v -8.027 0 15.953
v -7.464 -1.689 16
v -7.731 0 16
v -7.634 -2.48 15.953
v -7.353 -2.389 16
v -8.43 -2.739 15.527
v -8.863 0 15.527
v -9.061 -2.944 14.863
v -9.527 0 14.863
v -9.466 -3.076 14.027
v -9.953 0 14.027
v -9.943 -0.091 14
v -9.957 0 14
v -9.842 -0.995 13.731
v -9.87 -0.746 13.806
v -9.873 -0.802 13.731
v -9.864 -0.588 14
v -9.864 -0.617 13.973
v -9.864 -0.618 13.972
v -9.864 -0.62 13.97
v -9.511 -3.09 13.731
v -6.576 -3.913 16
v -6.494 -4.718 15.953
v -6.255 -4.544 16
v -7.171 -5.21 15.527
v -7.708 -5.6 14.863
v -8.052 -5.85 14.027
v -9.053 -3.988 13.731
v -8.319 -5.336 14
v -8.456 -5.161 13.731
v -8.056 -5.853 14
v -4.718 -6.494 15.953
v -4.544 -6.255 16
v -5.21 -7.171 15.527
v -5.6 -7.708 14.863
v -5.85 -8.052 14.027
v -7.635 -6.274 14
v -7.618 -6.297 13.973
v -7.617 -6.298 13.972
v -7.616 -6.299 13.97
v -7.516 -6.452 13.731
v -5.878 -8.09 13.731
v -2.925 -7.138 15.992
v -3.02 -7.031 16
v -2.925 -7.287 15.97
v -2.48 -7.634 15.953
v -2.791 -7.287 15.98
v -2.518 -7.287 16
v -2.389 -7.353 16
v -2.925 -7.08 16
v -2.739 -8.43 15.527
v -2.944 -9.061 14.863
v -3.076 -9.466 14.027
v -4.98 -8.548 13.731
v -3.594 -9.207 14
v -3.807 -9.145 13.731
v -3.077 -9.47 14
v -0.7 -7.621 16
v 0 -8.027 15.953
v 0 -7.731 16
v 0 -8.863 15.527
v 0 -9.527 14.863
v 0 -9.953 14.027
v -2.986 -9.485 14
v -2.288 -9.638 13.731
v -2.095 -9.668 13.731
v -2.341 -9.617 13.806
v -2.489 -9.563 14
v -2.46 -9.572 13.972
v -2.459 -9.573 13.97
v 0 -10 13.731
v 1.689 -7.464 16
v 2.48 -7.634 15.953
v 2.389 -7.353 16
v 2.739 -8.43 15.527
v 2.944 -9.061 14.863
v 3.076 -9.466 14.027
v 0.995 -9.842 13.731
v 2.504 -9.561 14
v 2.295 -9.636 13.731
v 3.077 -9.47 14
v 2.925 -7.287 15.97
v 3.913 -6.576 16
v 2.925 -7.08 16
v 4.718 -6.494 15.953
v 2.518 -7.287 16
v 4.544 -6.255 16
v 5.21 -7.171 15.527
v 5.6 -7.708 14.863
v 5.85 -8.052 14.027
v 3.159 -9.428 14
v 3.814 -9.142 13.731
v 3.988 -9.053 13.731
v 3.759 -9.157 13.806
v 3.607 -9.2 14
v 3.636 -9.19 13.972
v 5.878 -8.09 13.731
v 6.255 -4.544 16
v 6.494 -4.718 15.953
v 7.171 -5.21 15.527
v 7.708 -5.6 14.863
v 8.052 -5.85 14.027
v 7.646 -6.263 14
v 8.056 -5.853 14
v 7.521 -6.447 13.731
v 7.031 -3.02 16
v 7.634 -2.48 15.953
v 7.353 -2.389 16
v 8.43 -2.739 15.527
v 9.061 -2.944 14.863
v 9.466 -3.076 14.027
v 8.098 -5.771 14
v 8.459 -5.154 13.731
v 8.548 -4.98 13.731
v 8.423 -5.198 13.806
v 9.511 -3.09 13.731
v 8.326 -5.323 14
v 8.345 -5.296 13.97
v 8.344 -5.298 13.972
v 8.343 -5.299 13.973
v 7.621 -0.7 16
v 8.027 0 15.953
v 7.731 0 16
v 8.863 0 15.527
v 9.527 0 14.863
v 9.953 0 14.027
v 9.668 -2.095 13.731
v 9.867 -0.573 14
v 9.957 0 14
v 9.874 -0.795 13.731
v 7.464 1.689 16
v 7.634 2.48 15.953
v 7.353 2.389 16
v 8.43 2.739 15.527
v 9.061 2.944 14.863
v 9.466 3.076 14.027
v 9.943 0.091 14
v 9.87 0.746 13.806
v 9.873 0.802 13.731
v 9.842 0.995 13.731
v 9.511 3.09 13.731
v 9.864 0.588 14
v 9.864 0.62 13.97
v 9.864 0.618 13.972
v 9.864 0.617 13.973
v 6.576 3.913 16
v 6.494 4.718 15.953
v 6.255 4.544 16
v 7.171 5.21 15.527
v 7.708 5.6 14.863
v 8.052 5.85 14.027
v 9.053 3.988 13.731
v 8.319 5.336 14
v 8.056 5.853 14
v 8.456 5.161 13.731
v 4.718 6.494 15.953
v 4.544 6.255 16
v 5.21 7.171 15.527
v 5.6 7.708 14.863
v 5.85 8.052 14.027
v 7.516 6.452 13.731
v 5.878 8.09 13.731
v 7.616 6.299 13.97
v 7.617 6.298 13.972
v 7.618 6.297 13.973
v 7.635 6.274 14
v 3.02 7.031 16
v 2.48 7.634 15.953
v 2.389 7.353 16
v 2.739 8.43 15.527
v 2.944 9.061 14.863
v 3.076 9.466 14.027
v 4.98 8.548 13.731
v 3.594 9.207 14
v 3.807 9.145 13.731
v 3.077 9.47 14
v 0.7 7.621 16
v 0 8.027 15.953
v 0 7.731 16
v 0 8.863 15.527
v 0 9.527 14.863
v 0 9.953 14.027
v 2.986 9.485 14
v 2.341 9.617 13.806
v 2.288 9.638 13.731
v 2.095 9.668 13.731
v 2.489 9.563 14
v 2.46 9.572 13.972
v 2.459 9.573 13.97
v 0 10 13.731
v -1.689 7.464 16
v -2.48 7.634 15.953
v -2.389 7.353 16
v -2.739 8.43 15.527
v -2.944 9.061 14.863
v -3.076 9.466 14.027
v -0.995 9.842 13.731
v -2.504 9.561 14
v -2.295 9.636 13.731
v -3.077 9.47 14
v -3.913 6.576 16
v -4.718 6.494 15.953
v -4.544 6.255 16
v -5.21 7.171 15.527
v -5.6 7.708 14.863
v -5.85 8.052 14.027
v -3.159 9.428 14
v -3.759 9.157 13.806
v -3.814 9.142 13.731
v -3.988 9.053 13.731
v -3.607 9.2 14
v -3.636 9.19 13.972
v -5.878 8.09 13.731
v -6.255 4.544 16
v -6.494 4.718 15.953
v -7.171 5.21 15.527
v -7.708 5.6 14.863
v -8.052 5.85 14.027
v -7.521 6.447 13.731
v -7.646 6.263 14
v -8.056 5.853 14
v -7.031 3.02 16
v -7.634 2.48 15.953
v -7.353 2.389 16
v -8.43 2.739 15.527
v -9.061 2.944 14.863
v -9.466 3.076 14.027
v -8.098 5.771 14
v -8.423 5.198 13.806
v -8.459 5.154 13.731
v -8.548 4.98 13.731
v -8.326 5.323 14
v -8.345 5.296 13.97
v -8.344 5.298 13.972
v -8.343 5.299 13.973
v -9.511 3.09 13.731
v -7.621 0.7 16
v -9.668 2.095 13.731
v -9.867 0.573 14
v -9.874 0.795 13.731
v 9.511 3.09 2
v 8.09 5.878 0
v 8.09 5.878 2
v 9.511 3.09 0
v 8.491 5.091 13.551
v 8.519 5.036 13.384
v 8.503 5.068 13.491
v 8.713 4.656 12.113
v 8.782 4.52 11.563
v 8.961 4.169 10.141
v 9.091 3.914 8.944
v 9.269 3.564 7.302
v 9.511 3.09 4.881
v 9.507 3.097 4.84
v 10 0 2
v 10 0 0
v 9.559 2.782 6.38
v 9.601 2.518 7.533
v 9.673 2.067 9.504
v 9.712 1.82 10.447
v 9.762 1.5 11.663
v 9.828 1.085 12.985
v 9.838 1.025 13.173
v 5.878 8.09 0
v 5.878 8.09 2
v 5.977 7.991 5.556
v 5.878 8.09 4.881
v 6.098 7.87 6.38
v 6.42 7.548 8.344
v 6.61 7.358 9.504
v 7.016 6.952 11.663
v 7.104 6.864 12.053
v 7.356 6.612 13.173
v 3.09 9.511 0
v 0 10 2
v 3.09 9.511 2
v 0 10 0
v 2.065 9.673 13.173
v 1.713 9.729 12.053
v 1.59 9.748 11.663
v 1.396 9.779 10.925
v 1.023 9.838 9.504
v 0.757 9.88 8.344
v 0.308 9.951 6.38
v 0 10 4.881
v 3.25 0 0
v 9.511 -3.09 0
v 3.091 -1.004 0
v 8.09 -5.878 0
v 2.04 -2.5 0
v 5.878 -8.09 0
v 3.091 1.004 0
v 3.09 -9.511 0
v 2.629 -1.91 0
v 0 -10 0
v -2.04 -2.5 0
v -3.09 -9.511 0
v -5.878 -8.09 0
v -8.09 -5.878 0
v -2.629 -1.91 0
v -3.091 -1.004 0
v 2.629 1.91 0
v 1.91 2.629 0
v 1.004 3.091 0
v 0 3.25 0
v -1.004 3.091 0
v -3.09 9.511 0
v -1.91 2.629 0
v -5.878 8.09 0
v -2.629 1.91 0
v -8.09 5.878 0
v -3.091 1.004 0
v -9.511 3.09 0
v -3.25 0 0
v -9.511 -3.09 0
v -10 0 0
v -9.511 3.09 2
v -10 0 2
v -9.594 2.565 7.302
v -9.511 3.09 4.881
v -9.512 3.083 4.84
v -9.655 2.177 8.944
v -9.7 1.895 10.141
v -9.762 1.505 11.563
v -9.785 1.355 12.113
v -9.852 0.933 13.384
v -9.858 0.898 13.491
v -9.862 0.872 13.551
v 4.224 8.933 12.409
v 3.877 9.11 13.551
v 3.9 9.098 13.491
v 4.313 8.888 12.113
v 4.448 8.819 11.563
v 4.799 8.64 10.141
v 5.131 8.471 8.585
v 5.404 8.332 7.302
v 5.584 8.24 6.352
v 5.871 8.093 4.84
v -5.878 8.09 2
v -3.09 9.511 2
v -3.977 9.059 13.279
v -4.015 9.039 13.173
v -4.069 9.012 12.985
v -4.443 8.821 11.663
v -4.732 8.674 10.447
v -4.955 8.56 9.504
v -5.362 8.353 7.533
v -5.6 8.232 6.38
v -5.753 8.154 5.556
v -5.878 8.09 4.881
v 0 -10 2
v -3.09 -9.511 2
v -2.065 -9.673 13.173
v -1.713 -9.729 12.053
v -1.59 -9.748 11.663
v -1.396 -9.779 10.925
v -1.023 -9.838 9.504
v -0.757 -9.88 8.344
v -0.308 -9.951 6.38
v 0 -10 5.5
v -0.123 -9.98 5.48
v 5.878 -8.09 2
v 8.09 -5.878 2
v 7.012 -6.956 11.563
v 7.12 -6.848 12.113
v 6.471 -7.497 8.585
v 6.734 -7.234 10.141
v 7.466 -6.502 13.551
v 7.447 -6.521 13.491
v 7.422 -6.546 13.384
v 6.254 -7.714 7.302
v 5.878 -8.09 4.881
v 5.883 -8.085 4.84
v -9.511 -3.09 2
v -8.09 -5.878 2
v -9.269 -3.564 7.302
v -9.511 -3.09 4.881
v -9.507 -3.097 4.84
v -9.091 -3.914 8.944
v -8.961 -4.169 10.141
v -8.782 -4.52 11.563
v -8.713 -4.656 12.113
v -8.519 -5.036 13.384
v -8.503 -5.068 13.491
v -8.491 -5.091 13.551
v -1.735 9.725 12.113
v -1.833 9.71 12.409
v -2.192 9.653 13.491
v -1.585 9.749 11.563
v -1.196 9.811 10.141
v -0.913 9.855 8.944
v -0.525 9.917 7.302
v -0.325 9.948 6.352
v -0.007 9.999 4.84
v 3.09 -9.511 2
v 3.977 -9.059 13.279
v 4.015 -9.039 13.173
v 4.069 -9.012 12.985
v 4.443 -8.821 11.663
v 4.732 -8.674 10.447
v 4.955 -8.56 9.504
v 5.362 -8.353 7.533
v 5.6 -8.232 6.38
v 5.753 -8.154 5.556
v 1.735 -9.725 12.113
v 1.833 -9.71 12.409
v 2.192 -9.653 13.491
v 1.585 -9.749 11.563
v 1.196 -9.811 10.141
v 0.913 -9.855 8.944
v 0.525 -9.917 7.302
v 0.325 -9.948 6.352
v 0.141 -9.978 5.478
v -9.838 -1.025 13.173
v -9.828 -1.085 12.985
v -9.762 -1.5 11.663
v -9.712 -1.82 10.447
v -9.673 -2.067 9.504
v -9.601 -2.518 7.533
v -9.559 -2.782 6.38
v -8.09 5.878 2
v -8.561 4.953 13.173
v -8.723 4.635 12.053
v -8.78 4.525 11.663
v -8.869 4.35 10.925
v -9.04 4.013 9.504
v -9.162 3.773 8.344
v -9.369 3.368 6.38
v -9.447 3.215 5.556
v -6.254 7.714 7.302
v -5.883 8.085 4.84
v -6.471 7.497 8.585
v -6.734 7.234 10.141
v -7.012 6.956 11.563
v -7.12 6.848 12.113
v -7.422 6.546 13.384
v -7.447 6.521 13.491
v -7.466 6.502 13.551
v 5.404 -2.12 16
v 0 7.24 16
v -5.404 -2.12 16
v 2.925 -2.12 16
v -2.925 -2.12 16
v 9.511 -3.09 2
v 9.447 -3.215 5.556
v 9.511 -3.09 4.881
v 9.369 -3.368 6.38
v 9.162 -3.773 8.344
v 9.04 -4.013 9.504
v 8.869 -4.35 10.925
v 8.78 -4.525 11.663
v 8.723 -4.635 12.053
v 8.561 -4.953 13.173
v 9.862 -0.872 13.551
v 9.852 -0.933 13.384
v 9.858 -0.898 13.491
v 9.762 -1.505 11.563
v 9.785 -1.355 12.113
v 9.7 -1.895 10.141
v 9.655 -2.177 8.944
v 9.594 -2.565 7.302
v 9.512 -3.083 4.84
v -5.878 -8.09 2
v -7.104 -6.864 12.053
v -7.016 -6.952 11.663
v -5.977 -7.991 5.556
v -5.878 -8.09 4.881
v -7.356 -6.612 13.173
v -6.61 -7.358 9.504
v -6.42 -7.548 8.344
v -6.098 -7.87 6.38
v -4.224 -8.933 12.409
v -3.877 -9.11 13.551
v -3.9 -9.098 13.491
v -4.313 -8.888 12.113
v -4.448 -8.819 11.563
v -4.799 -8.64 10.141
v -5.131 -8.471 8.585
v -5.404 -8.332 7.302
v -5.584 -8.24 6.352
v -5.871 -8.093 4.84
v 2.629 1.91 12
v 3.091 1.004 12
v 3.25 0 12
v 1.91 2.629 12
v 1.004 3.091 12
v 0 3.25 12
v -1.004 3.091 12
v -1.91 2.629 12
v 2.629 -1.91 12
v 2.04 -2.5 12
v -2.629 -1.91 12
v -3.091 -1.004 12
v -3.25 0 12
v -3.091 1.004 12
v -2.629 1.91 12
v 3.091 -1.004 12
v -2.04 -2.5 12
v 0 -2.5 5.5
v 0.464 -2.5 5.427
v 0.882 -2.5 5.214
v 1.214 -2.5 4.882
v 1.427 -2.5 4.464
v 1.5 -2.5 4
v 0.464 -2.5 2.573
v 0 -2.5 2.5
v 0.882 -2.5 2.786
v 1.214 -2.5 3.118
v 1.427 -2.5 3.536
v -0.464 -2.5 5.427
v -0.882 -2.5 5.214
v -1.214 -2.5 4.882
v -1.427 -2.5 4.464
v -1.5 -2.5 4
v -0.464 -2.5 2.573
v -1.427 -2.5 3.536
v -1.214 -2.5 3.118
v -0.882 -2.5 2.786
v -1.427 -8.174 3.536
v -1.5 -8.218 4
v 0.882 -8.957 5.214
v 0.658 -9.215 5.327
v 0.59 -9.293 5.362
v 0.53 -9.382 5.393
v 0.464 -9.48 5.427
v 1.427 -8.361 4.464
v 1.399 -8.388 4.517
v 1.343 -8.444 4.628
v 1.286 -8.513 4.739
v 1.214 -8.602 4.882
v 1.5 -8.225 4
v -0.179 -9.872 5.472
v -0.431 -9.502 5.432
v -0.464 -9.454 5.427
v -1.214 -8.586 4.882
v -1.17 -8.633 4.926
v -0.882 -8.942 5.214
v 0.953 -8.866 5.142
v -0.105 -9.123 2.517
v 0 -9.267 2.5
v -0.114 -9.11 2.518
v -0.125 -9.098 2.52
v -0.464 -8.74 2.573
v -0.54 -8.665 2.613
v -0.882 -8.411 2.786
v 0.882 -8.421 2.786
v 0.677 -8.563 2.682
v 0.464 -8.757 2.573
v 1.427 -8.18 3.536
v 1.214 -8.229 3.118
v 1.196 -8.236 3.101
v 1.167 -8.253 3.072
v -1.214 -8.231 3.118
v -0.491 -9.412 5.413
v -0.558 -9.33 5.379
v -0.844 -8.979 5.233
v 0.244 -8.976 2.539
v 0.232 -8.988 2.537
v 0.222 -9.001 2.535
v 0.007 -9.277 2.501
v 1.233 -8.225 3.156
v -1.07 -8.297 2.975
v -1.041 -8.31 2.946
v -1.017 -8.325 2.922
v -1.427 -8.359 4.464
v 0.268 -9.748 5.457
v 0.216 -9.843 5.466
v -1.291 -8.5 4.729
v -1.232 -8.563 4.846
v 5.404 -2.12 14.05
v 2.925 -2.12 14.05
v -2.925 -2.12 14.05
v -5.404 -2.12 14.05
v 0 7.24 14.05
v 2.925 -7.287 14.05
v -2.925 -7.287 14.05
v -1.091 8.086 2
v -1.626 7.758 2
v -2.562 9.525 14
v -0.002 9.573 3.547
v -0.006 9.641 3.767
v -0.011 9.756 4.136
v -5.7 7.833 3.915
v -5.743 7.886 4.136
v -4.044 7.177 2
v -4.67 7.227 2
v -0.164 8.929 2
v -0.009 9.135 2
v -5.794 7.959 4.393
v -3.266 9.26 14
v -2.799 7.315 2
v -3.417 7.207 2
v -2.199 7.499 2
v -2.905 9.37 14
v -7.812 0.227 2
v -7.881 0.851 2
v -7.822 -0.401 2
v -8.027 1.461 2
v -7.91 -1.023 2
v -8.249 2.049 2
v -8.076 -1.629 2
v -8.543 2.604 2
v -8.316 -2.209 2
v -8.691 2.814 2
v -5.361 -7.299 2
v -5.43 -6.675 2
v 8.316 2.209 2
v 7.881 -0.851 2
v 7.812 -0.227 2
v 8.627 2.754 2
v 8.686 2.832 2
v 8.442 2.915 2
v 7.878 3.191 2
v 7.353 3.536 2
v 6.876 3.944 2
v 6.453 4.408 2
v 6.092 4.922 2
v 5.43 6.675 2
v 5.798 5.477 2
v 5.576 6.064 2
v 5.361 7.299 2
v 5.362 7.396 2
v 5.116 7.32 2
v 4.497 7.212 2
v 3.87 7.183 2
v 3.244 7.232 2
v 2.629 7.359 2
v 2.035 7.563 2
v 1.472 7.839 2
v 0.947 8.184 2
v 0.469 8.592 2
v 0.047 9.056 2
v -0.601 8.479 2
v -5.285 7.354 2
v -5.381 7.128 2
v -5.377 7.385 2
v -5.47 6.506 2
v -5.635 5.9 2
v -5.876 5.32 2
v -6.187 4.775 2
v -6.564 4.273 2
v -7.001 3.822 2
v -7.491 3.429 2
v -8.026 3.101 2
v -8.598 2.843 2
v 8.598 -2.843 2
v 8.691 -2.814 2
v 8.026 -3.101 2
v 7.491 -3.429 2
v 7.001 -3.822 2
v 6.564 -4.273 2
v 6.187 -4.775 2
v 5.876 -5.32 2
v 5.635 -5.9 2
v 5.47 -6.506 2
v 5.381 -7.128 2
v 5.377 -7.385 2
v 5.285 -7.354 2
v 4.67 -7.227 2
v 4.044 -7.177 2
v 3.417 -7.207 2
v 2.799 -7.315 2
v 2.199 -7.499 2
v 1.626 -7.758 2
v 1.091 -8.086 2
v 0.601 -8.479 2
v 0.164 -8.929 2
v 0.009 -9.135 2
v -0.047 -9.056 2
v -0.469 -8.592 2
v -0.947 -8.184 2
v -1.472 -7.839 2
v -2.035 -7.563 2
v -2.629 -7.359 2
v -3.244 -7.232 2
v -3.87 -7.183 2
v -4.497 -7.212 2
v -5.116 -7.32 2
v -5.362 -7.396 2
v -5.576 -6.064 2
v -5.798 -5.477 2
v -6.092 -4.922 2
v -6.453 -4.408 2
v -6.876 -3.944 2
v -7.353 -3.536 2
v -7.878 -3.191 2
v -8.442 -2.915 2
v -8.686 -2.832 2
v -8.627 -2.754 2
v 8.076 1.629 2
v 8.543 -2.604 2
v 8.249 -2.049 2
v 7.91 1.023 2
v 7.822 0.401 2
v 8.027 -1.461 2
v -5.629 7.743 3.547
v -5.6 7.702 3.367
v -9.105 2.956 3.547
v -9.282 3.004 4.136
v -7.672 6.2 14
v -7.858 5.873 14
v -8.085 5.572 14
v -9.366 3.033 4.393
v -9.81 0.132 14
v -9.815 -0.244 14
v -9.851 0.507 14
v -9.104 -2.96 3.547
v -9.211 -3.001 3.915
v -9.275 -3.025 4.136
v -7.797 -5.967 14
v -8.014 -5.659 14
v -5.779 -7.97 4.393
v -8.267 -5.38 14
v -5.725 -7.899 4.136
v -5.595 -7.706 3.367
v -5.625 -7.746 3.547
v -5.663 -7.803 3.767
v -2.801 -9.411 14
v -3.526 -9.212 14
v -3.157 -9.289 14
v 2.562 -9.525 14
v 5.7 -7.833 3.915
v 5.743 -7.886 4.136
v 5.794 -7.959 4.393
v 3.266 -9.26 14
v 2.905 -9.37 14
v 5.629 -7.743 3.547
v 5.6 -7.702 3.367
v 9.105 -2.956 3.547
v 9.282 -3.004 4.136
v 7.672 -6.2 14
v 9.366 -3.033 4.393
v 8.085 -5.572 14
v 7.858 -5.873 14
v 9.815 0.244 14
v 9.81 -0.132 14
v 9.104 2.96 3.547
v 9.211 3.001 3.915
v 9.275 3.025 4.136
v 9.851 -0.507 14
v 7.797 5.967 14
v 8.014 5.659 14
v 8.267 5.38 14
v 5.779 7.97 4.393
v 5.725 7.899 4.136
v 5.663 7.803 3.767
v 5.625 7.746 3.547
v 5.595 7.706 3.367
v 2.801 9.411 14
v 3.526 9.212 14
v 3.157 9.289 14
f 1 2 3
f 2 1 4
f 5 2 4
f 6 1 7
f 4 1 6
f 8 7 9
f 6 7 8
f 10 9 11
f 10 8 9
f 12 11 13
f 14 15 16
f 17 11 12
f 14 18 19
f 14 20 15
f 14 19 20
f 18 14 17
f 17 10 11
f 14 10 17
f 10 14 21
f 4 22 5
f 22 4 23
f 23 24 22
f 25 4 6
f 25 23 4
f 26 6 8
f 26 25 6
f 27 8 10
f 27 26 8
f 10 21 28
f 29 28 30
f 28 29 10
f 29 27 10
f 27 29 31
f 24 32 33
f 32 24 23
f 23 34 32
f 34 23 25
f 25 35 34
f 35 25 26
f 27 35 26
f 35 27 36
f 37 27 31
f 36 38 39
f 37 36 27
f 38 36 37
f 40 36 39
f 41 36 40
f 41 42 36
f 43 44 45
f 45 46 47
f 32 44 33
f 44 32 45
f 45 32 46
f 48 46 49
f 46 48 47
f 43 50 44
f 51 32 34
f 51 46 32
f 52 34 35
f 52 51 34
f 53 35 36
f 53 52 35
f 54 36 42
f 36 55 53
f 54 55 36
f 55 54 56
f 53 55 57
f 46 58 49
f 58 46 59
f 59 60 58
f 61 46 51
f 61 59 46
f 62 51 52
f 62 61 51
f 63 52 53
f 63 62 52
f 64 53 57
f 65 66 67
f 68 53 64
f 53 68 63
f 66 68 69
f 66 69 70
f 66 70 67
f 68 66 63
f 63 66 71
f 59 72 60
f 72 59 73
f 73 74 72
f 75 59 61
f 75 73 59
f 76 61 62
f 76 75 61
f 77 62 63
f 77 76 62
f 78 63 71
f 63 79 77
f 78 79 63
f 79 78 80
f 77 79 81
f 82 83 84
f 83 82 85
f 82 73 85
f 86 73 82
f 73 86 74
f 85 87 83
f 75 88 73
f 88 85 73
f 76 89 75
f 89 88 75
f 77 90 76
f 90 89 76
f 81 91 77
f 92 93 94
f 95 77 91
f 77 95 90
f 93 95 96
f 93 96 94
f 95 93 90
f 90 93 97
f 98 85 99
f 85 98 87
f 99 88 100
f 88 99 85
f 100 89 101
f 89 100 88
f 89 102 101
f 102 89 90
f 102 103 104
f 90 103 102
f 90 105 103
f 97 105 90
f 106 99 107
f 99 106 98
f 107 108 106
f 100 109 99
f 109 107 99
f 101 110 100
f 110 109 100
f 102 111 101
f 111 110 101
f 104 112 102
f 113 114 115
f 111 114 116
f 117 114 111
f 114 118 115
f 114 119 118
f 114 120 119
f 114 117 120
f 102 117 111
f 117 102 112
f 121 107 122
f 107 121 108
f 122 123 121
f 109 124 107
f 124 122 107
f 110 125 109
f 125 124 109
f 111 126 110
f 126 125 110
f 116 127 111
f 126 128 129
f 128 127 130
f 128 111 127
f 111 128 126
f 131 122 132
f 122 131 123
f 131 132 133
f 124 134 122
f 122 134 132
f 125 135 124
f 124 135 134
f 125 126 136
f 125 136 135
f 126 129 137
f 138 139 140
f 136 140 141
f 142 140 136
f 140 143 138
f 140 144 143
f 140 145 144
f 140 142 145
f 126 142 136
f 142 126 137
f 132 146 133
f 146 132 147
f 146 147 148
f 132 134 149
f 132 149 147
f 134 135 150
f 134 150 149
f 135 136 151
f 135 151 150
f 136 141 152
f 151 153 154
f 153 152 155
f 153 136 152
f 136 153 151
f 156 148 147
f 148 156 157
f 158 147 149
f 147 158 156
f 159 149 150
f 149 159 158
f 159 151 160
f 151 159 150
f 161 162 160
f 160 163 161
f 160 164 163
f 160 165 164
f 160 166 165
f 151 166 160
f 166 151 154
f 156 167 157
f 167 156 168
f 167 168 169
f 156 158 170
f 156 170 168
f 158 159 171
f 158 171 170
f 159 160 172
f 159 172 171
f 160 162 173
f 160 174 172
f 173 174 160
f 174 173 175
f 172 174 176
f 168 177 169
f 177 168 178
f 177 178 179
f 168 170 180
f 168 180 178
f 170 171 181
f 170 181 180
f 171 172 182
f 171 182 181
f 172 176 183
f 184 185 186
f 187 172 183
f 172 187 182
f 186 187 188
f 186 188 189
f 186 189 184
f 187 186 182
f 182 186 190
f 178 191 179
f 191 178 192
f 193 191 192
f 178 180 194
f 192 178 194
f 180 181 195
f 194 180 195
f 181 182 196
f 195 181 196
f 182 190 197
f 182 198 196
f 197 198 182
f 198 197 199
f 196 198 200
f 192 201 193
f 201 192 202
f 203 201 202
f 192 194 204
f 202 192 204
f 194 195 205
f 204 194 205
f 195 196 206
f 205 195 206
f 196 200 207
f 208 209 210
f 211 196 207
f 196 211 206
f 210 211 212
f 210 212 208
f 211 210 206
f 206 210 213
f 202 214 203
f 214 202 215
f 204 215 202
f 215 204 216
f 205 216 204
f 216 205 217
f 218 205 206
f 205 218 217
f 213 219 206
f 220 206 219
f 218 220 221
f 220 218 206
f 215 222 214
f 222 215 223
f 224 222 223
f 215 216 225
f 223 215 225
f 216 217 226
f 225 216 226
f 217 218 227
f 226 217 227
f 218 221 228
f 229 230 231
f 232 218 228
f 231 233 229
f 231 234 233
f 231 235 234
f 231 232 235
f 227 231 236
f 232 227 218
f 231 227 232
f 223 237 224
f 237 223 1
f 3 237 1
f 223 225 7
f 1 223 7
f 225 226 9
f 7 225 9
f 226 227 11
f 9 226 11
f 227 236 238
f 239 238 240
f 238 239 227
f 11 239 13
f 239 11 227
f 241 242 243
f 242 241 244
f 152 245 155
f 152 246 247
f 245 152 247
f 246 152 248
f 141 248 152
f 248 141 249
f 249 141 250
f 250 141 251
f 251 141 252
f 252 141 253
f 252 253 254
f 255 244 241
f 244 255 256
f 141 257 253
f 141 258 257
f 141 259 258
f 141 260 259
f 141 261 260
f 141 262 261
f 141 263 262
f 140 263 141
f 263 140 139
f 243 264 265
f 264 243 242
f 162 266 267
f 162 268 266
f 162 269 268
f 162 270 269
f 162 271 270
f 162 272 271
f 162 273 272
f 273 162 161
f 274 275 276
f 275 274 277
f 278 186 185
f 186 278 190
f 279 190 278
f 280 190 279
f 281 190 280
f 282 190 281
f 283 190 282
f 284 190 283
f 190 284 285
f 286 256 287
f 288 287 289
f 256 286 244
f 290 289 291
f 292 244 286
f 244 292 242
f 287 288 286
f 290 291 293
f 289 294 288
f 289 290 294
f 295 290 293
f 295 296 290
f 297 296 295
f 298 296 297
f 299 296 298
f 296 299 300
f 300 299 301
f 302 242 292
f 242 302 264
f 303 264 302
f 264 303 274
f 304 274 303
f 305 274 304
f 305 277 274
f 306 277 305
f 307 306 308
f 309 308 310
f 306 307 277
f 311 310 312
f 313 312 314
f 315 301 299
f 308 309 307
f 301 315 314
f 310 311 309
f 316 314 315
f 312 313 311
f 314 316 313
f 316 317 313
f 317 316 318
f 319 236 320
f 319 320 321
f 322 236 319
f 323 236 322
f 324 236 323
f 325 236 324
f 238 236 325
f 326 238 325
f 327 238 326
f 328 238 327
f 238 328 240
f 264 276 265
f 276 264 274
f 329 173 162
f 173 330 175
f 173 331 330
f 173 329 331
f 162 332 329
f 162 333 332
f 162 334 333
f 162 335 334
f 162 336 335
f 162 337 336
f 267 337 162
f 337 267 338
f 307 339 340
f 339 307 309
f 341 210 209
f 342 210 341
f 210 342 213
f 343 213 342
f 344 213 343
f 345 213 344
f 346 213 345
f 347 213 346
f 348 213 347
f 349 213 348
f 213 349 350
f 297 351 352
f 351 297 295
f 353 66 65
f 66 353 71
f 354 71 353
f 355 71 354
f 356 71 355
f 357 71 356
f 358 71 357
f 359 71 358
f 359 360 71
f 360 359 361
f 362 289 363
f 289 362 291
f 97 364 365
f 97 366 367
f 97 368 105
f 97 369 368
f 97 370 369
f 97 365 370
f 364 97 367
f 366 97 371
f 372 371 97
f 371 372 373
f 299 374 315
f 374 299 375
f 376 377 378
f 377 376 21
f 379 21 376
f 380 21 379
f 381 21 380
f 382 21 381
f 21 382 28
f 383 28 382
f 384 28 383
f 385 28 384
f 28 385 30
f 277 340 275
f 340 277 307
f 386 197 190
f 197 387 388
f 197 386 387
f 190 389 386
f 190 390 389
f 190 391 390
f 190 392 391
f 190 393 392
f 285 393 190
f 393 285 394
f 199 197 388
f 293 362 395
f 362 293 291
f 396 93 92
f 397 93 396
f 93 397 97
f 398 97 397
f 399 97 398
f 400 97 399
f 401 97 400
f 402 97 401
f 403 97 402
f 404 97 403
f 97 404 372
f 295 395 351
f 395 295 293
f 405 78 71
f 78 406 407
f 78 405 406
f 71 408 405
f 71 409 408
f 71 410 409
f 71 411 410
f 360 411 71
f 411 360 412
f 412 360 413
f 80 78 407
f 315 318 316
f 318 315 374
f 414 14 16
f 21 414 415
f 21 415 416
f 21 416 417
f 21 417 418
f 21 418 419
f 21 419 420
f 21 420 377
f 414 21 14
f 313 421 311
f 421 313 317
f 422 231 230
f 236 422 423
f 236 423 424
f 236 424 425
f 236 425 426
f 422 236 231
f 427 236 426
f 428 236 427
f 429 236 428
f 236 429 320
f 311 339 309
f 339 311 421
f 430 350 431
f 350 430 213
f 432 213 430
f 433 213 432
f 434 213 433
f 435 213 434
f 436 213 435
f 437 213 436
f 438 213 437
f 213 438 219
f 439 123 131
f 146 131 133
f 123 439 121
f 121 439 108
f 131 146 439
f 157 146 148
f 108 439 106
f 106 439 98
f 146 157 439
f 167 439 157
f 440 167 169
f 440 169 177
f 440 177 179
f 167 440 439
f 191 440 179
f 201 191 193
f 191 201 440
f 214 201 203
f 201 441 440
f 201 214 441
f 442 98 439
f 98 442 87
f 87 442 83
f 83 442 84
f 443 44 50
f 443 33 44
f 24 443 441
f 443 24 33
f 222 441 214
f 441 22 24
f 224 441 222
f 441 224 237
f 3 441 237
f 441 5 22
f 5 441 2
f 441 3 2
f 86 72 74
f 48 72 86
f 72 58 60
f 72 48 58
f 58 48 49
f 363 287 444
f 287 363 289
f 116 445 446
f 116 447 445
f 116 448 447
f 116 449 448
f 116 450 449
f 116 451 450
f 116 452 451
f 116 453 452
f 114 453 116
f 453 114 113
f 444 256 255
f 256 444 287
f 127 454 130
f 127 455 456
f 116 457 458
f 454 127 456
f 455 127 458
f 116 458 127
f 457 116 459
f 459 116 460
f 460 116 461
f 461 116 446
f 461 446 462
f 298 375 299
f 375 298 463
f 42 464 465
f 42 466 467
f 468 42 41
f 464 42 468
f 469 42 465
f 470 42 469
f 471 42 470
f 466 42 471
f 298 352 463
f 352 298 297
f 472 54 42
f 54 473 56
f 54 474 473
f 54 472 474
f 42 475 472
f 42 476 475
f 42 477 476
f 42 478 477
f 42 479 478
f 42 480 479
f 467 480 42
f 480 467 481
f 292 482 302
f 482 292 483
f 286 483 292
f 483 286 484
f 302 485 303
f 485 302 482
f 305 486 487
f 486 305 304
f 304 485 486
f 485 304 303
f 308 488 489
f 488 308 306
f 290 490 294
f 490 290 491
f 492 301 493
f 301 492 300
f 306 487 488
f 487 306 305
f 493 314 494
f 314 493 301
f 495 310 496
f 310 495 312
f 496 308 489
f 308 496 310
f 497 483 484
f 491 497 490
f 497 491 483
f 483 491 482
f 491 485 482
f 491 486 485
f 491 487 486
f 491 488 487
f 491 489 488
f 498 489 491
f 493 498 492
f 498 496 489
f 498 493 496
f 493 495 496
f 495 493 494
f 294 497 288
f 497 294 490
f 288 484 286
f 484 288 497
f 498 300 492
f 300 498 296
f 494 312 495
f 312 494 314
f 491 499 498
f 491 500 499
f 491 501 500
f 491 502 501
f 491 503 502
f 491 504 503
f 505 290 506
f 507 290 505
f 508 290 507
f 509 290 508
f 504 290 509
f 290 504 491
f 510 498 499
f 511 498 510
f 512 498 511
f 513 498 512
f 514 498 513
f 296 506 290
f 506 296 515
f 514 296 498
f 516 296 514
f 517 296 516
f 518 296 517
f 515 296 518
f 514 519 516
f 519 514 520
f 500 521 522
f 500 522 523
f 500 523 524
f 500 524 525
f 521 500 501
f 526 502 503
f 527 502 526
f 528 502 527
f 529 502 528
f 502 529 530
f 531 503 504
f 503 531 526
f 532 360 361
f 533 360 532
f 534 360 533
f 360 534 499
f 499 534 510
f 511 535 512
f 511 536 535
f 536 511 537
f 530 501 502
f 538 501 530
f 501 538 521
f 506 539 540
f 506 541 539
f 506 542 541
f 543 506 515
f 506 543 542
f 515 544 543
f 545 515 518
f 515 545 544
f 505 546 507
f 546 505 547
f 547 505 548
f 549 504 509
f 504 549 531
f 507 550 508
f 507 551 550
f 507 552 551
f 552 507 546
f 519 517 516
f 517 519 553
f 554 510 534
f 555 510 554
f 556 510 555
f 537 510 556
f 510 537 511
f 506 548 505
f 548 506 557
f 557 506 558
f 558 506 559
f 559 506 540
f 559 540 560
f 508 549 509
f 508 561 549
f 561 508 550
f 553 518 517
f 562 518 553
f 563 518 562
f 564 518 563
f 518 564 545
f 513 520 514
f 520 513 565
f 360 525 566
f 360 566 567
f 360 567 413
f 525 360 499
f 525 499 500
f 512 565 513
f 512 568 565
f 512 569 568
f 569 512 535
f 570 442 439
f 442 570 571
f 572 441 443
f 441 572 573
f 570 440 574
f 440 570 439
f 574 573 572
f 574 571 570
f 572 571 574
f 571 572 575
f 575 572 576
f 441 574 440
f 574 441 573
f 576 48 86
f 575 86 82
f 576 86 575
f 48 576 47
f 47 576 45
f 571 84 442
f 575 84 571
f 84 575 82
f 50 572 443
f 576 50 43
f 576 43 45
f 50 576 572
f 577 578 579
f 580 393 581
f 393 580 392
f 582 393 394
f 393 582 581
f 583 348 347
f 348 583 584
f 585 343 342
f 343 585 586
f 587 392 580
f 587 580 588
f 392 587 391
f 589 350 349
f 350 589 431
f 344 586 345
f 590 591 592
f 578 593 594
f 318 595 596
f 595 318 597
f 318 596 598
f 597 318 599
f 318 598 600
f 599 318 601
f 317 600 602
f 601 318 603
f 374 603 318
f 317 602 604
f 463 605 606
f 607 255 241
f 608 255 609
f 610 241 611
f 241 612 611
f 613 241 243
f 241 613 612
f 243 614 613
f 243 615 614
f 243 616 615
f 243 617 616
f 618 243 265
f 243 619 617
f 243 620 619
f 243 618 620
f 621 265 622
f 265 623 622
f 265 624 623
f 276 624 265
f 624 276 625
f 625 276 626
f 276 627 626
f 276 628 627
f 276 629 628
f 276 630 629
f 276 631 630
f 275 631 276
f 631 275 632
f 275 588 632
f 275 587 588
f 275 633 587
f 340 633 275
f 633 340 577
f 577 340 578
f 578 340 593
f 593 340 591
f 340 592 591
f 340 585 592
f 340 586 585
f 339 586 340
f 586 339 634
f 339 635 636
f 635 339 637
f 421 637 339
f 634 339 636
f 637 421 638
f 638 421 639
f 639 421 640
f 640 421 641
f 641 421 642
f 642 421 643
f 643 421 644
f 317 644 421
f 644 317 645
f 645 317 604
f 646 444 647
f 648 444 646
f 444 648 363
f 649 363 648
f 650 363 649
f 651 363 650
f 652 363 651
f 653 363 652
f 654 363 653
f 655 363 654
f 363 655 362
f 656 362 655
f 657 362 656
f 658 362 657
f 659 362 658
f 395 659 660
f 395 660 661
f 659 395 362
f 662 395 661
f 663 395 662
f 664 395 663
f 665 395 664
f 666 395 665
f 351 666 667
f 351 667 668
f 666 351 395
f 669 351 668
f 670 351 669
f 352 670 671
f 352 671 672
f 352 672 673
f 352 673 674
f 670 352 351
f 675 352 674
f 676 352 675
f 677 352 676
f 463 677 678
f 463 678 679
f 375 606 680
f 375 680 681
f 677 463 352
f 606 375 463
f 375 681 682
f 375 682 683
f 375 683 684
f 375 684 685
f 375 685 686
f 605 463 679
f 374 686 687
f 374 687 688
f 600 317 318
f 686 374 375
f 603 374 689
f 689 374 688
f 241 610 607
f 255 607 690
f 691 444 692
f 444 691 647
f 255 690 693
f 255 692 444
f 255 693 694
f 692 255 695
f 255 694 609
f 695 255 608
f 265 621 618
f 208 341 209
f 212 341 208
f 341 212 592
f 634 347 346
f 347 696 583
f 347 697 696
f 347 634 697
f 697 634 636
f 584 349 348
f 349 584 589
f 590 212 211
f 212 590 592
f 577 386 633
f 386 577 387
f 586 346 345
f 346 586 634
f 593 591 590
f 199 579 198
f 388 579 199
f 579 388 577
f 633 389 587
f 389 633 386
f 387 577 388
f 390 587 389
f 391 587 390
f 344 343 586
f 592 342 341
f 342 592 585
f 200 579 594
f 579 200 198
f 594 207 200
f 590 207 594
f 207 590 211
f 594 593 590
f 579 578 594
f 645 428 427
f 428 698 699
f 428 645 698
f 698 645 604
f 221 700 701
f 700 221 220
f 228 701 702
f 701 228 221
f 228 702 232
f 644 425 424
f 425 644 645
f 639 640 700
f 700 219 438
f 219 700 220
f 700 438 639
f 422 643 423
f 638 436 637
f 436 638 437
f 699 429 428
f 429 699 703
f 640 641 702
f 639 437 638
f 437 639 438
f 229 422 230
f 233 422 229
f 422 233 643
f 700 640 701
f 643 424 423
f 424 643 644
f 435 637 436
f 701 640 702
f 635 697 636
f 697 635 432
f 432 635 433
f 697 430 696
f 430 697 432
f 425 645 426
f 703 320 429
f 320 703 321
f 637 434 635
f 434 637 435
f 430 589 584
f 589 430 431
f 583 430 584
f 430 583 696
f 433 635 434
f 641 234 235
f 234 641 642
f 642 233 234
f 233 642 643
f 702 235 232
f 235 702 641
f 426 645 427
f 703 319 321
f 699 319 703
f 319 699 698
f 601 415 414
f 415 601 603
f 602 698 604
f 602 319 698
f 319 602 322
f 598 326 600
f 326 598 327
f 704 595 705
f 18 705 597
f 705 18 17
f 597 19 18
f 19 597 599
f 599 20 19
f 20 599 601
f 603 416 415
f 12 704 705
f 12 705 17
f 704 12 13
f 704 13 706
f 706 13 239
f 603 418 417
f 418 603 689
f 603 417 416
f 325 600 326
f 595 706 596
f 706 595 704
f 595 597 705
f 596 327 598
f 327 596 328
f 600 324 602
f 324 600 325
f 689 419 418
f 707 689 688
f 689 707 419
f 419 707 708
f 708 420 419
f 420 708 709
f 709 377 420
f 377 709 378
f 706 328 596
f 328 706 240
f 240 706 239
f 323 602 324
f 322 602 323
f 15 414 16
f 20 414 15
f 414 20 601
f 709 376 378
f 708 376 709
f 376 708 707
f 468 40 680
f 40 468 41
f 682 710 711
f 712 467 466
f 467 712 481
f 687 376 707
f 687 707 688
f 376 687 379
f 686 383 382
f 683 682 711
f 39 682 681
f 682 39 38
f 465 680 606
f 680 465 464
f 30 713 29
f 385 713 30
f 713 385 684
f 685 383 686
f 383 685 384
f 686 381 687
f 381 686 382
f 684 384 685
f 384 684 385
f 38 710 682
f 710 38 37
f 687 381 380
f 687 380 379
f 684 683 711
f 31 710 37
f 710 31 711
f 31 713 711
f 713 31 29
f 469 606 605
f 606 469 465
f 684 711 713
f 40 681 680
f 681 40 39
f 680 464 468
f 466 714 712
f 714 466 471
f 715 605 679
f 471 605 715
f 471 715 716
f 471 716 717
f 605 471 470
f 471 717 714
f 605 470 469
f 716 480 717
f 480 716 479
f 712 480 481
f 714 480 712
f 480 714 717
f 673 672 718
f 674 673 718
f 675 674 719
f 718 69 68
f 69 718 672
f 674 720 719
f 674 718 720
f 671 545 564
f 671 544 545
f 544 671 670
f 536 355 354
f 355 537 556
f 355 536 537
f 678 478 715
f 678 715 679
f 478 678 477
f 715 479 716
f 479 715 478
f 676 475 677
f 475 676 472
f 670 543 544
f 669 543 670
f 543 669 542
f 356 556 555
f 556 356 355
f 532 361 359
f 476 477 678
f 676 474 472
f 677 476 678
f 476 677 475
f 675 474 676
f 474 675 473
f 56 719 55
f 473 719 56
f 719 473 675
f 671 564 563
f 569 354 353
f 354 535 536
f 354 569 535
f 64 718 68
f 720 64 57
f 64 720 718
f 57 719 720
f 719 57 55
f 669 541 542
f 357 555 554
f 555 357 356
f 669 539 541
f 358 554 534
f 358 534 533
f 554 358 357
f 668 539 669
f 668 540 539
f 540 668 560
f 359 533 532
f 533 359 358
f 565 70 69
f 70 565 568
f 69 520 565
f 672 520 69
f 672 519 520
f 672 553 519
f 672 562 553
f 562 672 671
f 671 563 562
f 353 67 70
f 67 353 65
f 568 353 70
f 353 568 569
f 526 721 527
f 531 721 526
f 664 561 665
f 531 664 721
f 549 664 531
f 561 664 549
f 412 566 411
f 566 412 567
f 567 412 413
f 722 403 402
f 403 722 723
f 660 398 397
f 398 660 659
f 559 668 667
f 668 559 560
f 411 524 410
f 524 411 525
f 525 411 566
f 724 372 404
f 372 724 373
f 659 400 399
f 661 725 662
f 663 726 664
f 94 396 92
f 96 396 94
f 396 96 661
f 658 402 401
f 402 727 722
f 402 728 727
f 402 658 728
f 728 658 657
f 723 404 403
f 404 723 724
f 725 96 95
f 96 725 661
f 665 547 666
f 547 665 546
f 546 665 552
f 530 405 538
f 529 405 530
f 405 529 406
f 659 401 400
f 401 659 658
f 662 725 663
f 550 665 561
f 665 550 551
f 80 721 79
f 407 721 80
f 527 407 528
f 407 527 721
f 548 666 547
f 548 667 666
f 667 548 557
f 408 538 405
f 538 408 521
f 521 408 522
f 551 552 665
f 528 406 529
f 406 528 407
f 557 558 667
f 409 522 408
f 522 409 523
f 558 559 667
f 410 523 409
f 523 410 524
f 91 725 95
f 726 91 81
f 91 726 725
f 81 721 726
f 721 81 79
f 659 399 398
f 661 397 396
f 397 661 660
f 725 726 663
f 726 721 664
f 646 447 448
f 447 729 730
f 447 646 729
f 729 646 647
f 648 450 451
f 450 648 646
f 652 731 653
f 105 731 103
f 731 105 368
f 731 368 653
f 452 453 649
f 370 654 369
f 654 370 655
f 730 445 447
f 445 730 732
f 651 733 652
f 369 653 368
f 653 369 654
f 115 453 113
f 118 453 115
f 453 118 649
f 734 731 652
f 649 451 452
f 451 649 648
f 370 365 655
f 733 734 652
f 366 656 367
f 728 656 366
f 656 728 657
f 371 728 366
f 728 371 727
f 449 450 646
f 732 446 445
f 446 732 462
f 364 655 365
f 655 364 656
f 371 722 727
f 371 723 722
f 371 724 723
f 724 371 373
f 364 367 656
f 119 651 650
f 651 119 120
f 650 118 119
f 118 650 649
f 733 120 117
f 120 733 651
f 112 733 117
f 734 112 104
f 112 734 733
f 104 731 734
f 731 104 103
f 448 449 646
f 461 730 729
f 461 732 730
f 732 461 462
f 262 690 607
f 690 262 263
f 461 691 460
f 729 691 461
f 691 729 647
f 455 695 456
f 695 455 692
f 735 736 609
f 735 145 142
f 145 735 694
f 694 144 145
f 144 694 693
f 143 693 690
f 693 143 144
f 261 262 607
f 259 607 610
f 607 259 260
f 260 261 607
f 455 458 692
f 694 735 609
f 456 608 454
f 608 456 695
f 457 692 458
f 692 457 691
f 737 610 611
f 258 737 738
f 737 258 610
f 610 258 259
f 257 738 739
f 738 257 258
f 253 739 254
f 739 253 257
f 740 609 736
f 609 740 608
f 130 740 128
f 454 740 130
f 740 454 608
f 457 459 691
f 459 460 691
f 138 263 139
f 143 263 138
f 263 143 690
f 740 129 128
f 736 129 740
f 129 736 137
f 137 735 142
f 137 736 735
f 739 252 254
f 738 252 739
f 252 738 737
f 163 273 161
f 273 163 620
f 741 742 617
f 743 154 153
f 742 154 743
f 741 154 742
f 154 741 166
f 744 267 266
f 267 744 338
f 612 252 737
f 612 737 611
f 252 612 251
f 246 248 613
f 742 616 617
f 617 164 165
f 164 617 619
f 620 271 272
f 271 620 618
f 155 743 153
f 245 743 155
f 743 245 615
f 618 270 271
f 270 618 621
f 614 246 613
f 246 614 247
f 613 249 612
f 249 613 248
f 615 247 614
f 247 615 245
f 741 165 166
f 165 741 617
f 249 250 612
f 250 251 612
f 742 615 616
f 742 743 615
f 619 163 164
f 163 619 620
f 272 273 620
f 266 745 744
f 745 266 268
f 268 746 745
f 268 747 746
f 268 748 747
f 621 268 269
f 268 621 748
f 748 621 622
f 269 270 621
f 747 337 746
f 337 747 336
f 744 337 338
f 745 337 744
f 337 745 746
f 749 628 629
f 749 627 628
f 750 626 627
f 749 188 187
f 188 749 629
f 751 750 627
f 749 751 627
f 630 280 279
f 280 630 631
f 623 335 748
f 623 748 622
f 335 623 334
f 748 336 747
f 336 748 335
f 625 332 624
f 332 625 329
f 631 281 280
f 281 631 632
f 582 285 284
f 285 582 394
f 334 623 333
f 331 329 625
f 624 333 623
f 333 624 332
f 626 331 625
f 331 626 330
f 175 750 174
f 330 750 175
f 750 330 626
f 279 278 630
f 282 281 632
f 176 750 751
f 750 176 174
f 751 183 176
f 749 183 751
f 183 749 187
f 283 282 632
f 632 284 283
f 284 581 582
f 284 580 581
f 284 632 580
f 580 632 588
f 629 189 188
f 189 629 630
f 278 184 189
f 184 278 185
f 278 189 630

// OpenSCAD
/*

Parametric Potentiometer Knob Generator
version 1.1
2012 Steve Cooley
http://sc-fa.com
http://beatseqr.com
http://hapticsynapses.com

parametric potentiometer knob generator by steve cooley is licensed under a Creative Commons Attribution-NonCommercial-ShareAlike 3.0 Unported License. Based on a work at sc-fa.com. Permissions beyond the scope of this license may be available at http://sc-fa.com/blog/contact.

view terms of the license here:
http://creativecommons.org/licenses/by-nc-sa/3.0/


version history
---------------
1.1 2012-04-12 fixed the arrow indicator code to be more robust and easier to adjust parameters for.
1.0 2012-03-?? initial release.


*/


//
//
// Physical attributes, basic
//
//

knob_radius_top = 10;
knob_radius_bottom = 10;
knob_height = 16;
knob_smoothness = 20;

shaft_radius = 3.25;
shaft_height = 13;
shaft_smoothness = 20;

shaft_is_flatted = true;
flat_size_adjustment = -0.0;
// you won't need to mess with this. less than 5 makes it disappear. you can, however,
// set the adjustment to be a negative decimal if you need a flat but not as big as the default. 
// go positive if you need a bigger flat
flat_size = 5 + flat_size_adjustment;

// some potentiometers need to have their knobs affixed with a set screw.
set_screw = true;
set_screw_radius = 1.5;
set_screw_depth = 9;
set_screw_height = 4;
quality_of_set_screw = 20;

//
// 
// Decorations
//
//

//
// top edge smoothing
// thanks to http://www.iheartrobotics.com/ for the articles!
//

smoothing = true;
smoothing_radius = 3;				// tweak on this one, how much smoothing to apply
smooth = 20;						// tweak on this one, Number of facets of rounding cylinder

ct = -0.1; 							// circle translate? not sure.
circle_radius = knob_radius_top;  	// just match the top edge radius
circle_height = 1; 					// actually.. I don't know what this does.
pad = 0.2;							// Padding to maintain manifold


//
// directional indicators
//

// this is a corner edge of a cube sticking out of the cylinder at the bottom
// you can use it instead of the arrow shaped cutout in the top if you like. Or both.

pointy_external_indicator = false;
pointy_external_indicator_height = 11;
pointy_external_indicator_pokey_outey_ness = -0.0; // 
pokey_outey_value = pointy_external_indicator_pokey_outey_ness - 1 - pad;
pokey_outey = [pokey_outey_value, pokey_outey_value,0];

// there's an arrow shaped hole you can have. There aren't a lot of controls for this.
// please feel free to improve on this script here.

arrow_indicator = true;
arrow_indicator_scale = 1.3;
arrow_indicator_translate = [0,1,16];
arrow_scale_head = 2;
arrow_scale_shaft = 1.5;

//
// indentations
//

// for spherical indentations, set the quantity, quality, size, and adjust the placement
indentations_sphere = false;
sphere_number_of_indentations = 12;
sphere_quality_of_indentations = 4;
size_of_sphere_indentations = 4;
// the first number in this set moves the spheres in or out. smaller is closer to the middle
// the second number in this set moves the spheres left or right
// the third number in this set moves the speheres up or down
translation_of_sphere_indentations = [10,0,15];
// in case you are using an odd number of indentations, you way want to adjust the starting angle
// so that they align to the front or set screw locations.
sphere_starting_rotation = 90;

// for cylinder indentations, set quantity, quality, radius, height, and placement
indentations_cylinder = true;
cylinder_number_of_indentations = 10;
cylinder_quality_of_indentations = 50;
radius_of_cylinder_indentations_top = 3;
radius_of_cylinder_indentations_bottom = 5;
height_of_cylinder_indentations = 12;
translation_of_cylinder_indentations = [0,8,-8];
cylinder_starting_rotation = -33.3;

// these are some setup variables... you probably won't need to mess with them.
negative_knob_radius = knob_radius_bottom*-1;


// this is the main module. It calls the submodules.
make_the_knob();

module make_the_knob()
{
	difference()
		{
		difference()
			{
		
			difference() 
				{
				difference() 
					{
					
					union()
						{
						
						difference()
							{
							// main cylinder
							cylinder(r1=knob_radius_bottom,r2=knob_radius_top,h=knob_height, $fn=knob_smoothness);
							
							smoothing();				
		
							}
				
						external_direction_indicator();	
						}
					
					shaft_hole();
					}
					
				set_screw_hole();
				}
			
			arrow_indicator();
			indentations();
		}
	}

}

module smoothing() {

// smoothing the top
				if(smoothing == true)
					{		
						translate([0,0,knob_height])
						rotate([180,0,0])
						difference() {
							rotate_extrude(convexity=10,  $fn = smooth)
							translate([circle_radius-ct-smoothing_radius+pad,ct-pad,0])
							square(smoothing_radius+pad,smoothing_radius+pad);
	
							rotate_extrude(convexity=10,  $fn = smooth)
							translate([circle_radius-ct-smoothing_radius,ct+smoothing_radius,0])
							circle(r=smoothing_radius,$fn=smooth);
							}	
					}
}

module external_direction_indicator() {

				if(pointy_external_indicator == true)
						{
						
						
						// outer pointy indicator
						rotate([0,0,45])
						translate(pokey_outey)
						// cube size of 8 minimum to point out
						cube(size=[knob_radius_bottom,knob_radius_bottom,pointy_external_indicator_height],center=false);
						}

}

module shaft_hole() {
				// shaft hole
				difference()
					{
					
					// round shaft hole
					translate([ 0, 0, -1 ]) 
					cylinder(r=shaft_radius,h=shaft_height, $fn=shaft_smoothness);
					
					if(shaft_is_flatted == true)
						{
						// D shaft shape for shaft cutout
						rotate( [0,0,90]) 
						translate([-7.5,-5,0]) 
						cube(size=[flat_size,10,13],center=false);
						}
					}
}


module set_screw_hole() {

			if(set_screw == true)
				{
				// set screw hole
				rotate ([90,0,0])
				translate([ 0, set_screw_height, 1 ])
				cylinder(r=set_screw_radius,h=set_screw_depth, $fn=quality_of_set_screw);
				}
}

module arrow_indicator() {
		if(arrow_indicator == true)
			{
			translate(arrow_indicator_translate)
			// begin arrow top cutout
			// translate([(knob_radius/2),knob_height,knob_height])
			rotate([90,0,45])
			scale([arrow_indicator_scale*.3,arrow_indicator_scale*.3,arrow_indicator_scale*.3])
			union()
				{			  
				rotate([90,45,0])
				scale([arrow_scale_head,arrow_scale_head,1])
				cylinder(r=8, h=10, $fn=3, center=true);
				rotate([90,45,0])
				translate([-10,0,0])
				scale([arrow_scale_shaft,arrow_scale_shaft,1])
				cube(size=[15,10,10],center=true);
				}
			}
}

module indentations() {

if(indentations_sphere == true)
			{
			for (z = [0:sphere_number_of_indentations]) 
				{
				rotate([0,0,sphere_starting_rotation+((360/sphere_number_of_indentations)*z)])
				translate(translation_of_sphere_indentations)
				sphere(size_of_sphere_indentations, $fn=sphere_quality_of_indentations); 
				}
			}
if(indentations_cylinder == true)
			{
			for (z = [0:cylinder_number_of_indentations]) 
				{
				rotate([0,0,cylinder_starting_rotation+((360/cylinder_number_of_indentations)*z)])
				
				translate([negative_knob_radius,0,knob_height])
				translate(translation_of_cylinder_indentations)
				cylinder(r1=radius_of_cylinder_indentations_bottom, r2=radius_of_cylinder_indentations_top, h=height_of_cylinder_indentations, center=true, $fn=cylinder_quality_of_indentations); 
				}
			}
		}
